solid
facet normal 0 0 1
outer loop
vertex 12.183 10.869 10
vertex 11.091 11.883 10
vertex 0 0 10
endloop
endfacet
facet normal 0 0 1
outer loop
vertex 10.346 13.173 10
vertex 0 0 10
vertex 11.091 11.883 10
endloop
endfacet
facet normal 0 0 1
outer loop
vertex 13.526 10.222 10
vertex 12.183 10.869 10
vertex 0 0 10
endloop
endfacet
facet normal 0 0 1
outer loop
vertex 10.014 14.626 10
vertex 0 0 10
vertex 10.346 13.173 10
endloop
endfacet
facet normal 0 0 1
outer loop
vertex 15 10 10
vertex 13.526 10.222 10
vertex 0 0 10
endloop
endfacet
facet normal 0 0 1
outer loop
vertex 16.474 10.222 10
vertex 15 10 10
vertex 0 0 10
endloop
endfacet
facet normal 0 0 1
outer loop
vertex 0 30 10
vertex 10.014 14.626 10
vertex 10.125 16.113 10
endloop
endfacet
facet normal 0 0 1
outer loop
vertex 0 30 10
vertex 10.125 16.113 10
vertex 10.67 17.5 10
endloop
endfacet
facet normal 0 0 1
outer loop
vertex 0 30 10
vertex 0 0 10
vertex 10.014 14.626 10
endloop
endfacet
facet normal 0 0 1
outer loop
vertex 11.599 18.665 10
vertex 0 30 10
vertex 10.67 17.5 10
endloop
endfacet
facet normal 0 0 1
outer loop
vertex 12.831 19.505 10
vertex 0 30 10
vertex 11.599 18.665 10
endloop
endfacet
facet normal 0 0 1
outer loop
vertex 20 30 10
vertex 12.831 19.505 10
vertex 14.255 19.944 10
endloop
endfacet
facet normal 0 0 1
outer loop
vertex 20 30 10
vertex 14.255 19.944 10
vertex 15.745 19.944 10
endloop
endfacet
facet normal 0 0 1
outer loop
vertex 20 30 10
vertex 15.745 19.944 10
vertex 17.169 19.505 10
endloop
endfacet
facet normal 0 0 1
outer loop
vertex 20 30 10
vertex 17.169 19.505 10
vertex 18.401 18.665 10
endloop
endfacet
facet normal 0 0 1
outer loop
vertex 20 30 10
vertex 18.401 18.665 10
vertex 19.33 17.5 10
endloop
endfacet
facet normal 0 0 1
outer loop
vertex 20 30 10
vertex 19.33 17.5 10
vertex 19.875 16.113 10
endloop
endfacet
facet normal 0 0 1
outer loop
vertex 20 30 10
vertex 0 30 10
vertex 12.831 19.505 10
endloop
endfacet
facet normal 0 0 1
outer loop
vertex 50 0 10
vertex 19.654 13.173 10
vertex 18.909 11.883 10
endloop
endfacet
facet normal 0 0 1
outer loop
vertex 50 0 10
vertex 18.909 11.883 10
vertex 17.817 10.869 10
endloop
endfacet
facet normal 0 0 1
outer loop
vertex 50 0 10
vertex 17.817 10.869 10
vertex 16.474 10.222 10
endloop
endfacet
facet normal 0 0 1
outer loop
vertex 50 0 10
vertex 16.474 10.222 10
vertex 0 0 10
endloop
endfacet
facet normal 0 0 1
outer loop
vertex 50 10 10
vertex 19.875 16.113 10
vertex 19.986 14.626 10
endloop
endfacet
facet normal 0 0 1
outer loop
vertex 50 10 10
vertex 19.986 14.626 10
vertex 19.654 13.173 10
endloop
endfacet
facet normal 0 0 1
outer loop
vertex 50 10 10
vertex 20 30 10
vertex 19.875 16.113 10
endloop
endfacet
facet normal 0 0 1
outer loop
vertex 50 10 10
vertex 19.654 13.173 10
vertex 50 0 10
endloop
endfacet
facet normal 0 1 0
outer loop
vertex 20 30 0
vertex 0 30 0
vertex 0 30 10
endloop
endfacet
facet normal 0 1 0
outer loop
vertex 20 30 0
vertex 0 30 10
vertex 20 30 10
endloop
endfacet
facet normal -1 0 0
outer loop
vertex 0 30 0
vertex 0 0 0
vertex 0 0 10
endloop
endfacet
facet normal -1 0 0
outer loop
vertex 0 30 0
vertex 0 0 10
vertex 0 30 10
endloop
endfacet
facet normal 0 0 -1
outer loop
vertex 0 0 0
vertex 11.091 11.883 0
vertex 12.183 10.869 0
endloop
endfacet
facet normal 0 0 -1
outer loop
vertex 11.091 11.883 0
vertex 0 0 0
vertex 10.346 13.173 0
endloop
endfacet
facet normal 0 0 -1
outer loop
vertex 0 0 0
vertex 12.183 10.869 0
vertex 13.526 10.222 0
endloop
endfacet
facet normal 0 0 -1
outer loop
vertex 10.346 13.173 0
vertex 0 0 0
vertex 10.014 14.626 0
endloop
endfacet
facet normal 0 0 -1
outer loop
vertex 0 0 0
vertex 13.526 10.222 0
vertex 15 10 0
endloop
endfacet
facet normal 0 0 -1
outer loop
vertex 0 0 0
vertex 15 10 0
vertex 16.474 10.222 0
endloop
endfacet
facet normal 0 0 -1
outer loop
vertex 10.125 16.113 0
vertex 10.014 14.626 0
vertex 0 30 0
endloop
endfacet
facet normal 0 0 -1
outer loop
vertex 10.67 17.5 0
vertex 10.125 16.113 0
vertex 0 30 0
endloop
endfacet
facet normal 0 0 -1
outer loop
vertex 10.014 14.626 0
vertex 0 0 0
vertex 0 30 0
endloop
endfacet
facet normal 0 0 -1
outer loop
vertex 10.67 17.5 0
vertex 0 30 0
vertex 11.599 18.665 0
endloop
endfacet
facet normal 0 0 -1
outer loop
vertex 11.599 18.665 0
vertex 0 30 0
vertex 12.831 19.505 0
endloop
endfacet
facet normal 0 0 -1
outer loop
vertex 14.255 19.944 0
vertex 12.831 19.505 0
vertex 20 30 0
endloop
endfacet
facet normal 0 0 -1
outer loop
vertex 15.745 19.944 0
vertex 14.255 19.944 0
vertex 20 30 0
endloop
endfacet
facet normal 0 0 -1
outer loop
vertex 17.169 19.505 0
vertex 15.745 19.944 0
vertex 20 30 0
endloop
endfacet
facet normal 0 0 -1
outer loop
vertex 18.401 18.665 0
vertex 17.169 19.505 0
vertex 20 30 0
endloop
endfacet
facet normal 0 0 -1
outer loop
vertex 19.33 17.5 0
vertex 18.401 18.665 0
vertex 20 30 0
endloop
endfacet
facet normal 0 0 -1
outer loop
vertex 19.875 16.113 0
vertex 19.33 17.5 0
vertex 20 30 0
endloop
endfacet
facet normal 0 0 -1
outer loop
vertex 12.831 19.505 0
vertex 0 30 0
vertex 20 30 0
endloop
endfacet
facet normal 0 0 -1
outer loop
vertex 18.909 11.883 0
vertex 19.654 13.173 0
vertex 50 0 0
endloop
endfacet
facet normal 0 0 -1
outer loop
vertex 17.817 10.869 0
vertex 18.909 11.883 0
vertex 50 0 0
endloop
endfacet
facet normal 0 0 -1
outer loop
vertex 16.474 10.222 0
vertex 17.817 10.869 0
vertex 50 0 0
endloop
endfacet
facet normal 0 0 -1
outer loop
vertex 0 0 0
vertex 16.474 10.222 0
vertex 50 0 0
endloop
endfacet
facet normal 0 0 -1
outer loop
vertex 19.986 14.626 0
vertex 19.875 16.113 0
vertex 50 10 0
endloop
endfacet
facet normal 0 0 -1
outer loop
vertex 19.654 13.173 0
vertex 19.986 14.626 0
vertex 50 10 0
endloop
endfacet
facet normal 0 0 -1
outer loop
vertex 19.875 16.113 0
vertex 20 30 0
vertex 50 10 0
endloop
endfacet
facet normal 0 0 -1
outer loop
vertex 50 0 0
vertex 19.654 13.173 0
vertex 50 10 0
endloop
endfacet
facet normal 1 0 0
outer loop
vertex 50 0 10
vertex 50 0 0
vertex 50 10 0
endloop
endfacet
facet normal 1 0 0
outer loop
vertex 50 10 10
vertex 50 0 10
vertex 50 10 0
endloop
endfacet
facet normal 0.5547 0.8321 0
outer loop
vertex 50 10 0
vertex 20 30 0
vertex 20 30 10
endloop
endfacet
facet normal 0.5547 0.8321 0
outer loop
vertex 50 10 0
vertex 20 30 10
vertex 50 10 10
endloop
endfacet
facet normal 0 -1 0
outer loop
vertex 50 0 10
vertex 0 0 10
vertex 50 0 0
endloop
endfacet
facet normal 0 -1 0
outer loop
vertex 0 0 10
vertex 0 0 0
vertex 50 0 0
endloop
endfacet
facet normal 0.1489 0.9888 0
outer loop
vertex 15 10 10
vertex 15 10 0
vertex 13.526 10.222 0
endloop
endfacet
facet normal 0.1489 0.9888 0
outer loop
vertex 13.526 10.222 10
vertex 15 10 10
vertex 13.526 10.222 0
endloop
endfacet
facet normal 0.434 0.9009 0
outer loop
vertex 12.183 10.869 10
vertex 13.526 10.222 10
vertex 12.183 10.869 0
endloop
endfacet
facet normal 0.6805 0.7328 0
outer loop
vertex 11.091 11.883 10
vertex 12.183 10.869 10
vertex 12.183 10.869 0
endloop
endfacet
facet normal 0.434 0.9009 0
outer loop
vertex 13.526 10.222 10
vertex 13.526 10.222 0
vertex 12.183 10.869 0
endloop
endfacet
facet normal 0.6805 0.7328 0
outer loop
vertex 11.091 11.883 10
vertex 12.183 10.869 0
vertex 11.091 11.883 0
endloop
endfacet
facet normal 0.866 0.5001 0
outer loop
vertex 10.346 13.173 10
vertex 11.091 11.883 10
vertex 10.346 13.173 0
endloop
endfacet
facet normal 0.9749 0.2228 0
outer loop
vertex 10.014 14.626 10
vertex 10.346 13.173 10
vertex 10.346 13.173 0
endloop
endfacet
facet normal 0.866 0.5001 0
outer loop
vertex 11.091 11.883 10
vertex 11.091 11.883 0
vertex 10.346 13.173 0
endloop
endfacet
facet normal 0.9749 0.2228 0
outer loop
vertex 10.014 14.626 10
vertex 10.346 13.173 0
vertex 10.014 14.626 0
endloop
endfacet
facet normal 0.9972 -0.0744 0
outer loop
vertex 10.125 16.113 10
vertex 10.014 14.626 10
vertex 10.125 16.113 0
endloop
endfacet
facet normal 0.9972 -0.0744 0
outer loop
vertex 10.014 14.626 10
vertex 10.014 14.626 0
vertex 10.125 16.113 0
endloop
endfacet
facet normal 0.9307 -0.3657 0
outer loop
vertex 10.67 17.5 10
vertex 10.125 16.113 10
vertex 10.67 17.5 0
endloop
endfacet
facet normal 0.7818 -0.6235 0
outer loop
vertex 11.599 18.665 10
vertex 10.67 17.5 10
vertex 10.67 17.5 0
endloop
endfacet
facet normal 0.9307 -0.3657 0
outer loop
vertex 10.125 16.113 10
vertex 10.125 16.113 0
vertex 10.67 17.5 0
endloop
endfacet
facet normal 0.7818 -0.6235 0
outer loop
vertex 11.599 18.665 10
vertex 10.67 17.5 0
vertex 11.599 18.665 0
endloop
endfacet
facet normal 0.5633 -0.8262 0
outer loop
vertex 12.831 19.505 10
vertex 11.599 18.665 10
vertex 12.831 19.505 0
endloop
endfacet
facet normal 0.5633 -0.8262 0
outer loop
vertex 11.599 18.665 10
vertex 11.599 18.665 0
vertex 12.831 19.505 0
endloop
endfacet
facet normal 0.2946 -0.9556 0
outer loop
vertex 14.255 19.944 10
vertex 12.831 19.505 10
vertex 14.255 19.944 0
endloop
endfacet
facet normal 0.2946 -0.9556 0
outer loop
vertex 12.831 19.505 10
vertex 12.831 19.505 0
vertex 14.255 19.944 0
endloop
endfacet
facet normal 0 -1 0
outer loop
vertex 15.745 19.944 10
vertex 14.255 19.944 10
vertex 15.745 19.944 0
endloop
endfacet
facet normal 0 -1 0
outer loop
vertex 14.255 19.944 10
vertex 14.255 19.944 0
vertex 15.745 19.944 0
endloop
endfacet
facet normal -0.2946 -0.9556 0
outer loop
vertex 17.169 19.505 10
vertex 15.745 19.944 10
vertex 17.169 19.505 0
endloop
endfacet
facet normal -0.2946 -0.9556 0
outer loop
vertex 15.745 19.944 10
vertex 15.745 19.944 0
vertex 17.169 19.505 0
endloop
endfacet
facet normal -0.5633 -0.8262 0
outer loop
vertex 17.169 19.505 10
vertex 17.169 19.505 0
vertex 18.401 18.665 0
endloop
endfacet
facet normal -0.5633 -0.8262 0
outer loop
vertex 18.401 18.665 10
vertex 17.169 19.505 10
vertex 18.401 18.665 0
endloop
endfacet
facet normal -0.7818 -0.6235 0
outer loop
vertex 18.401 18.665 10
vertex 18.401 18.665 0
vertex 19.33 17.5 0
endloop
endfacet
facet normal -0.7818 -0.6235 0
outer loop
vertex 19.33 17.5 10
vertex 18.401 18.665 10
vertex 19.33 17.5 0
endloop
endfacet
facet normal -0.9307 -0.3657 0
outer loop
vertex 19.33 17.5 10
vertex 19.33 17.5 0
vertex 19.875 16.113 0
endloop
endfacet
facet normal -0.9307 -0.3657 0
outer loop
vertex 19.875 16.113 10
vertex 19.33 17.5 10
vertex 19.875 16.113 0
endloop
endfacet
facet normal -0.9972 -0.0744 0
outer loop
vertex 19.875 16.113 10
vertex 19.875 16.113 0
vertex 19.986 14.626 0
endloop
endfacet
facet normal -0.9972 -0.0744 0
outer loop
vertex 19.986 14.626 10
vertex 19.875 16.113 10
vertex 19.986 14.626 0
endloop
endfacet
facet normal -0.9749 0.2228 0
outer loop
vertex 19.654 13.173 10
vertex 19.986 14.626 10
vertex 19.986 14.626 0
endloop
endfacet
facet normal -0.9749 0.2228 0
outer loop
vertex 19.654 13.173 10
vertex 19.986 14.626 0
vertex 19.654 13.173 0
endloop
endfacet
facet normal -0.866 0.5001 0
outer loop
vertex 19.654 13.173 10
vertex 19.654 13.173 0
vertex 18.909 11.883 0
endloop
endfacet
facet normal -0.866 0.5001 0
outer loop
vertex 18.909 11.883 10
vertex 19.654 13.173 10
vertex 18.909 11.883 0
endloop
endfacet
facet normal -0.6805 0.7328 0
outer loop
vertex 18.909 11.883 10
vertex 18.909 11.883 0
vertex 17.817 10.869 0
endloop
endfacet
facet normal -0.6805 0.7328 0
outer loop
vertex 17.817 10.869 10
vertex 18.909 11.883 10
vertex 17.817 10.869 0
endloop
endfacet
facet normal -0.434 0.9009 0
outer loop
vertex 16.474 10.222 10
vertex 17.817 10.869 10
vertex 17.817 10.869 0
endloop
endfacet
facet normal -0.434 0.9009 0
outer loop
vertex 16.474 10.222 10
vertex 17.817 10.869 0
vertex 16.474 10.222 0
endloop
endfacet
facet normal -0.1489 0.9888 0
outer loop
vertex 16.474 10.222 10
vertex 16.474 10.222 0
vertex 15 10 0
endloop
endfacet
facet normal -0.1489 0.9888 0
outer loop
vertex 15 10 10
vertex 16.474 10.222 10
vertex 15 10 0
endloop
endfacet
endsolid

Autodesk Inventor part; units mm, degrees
ref_plane "YZ Plane" through (0, 0, 0) normal (1, 0, 0) x (0, 1, 0)
ref_plane "XZ Plane" through (0, 0, 0) normal (0, 1, 0) x (-1, 0, 0)
ref_plane "XY Plane" through (0, 0, 0) normal (0, 0, 1) x (1, 0, 0)
sketch "Esboço1" plane through (0, 0, 0) normal (0, 0, 1) x (1, 0, 0)
  line L0 (0, 0) -> (50, 0)
  line L1 (50, 0) -> (50, 10)
  line L2 (0, 0) -> (0, 30)
  line L3 (0, 30) -> (20, 30)
  line L4 (20, 30) -> (50, 10)
  dimension "d0" = 50
  dimension "d1" = 10
  dimension "d2" = 30
  dimension "d3" = 20
extrude "Extrusão1" add sketch "Esboço1" along normal blind 10
sketch "Esboço2" plane through (0, 0, 10) normal (0, 0, 1) x (1, 0, 0)
  line L0 (0, 30) -> (0, 0) projected
  line L1 (0, 0) -> (50, 0) projected
  point P0 (15, 15)
  dimension "d6" = 15
  dimension "d14" = 15
hole "Furo1" at (15, 15, 10) direction (0, 0, -1) diameter 10 end through all
